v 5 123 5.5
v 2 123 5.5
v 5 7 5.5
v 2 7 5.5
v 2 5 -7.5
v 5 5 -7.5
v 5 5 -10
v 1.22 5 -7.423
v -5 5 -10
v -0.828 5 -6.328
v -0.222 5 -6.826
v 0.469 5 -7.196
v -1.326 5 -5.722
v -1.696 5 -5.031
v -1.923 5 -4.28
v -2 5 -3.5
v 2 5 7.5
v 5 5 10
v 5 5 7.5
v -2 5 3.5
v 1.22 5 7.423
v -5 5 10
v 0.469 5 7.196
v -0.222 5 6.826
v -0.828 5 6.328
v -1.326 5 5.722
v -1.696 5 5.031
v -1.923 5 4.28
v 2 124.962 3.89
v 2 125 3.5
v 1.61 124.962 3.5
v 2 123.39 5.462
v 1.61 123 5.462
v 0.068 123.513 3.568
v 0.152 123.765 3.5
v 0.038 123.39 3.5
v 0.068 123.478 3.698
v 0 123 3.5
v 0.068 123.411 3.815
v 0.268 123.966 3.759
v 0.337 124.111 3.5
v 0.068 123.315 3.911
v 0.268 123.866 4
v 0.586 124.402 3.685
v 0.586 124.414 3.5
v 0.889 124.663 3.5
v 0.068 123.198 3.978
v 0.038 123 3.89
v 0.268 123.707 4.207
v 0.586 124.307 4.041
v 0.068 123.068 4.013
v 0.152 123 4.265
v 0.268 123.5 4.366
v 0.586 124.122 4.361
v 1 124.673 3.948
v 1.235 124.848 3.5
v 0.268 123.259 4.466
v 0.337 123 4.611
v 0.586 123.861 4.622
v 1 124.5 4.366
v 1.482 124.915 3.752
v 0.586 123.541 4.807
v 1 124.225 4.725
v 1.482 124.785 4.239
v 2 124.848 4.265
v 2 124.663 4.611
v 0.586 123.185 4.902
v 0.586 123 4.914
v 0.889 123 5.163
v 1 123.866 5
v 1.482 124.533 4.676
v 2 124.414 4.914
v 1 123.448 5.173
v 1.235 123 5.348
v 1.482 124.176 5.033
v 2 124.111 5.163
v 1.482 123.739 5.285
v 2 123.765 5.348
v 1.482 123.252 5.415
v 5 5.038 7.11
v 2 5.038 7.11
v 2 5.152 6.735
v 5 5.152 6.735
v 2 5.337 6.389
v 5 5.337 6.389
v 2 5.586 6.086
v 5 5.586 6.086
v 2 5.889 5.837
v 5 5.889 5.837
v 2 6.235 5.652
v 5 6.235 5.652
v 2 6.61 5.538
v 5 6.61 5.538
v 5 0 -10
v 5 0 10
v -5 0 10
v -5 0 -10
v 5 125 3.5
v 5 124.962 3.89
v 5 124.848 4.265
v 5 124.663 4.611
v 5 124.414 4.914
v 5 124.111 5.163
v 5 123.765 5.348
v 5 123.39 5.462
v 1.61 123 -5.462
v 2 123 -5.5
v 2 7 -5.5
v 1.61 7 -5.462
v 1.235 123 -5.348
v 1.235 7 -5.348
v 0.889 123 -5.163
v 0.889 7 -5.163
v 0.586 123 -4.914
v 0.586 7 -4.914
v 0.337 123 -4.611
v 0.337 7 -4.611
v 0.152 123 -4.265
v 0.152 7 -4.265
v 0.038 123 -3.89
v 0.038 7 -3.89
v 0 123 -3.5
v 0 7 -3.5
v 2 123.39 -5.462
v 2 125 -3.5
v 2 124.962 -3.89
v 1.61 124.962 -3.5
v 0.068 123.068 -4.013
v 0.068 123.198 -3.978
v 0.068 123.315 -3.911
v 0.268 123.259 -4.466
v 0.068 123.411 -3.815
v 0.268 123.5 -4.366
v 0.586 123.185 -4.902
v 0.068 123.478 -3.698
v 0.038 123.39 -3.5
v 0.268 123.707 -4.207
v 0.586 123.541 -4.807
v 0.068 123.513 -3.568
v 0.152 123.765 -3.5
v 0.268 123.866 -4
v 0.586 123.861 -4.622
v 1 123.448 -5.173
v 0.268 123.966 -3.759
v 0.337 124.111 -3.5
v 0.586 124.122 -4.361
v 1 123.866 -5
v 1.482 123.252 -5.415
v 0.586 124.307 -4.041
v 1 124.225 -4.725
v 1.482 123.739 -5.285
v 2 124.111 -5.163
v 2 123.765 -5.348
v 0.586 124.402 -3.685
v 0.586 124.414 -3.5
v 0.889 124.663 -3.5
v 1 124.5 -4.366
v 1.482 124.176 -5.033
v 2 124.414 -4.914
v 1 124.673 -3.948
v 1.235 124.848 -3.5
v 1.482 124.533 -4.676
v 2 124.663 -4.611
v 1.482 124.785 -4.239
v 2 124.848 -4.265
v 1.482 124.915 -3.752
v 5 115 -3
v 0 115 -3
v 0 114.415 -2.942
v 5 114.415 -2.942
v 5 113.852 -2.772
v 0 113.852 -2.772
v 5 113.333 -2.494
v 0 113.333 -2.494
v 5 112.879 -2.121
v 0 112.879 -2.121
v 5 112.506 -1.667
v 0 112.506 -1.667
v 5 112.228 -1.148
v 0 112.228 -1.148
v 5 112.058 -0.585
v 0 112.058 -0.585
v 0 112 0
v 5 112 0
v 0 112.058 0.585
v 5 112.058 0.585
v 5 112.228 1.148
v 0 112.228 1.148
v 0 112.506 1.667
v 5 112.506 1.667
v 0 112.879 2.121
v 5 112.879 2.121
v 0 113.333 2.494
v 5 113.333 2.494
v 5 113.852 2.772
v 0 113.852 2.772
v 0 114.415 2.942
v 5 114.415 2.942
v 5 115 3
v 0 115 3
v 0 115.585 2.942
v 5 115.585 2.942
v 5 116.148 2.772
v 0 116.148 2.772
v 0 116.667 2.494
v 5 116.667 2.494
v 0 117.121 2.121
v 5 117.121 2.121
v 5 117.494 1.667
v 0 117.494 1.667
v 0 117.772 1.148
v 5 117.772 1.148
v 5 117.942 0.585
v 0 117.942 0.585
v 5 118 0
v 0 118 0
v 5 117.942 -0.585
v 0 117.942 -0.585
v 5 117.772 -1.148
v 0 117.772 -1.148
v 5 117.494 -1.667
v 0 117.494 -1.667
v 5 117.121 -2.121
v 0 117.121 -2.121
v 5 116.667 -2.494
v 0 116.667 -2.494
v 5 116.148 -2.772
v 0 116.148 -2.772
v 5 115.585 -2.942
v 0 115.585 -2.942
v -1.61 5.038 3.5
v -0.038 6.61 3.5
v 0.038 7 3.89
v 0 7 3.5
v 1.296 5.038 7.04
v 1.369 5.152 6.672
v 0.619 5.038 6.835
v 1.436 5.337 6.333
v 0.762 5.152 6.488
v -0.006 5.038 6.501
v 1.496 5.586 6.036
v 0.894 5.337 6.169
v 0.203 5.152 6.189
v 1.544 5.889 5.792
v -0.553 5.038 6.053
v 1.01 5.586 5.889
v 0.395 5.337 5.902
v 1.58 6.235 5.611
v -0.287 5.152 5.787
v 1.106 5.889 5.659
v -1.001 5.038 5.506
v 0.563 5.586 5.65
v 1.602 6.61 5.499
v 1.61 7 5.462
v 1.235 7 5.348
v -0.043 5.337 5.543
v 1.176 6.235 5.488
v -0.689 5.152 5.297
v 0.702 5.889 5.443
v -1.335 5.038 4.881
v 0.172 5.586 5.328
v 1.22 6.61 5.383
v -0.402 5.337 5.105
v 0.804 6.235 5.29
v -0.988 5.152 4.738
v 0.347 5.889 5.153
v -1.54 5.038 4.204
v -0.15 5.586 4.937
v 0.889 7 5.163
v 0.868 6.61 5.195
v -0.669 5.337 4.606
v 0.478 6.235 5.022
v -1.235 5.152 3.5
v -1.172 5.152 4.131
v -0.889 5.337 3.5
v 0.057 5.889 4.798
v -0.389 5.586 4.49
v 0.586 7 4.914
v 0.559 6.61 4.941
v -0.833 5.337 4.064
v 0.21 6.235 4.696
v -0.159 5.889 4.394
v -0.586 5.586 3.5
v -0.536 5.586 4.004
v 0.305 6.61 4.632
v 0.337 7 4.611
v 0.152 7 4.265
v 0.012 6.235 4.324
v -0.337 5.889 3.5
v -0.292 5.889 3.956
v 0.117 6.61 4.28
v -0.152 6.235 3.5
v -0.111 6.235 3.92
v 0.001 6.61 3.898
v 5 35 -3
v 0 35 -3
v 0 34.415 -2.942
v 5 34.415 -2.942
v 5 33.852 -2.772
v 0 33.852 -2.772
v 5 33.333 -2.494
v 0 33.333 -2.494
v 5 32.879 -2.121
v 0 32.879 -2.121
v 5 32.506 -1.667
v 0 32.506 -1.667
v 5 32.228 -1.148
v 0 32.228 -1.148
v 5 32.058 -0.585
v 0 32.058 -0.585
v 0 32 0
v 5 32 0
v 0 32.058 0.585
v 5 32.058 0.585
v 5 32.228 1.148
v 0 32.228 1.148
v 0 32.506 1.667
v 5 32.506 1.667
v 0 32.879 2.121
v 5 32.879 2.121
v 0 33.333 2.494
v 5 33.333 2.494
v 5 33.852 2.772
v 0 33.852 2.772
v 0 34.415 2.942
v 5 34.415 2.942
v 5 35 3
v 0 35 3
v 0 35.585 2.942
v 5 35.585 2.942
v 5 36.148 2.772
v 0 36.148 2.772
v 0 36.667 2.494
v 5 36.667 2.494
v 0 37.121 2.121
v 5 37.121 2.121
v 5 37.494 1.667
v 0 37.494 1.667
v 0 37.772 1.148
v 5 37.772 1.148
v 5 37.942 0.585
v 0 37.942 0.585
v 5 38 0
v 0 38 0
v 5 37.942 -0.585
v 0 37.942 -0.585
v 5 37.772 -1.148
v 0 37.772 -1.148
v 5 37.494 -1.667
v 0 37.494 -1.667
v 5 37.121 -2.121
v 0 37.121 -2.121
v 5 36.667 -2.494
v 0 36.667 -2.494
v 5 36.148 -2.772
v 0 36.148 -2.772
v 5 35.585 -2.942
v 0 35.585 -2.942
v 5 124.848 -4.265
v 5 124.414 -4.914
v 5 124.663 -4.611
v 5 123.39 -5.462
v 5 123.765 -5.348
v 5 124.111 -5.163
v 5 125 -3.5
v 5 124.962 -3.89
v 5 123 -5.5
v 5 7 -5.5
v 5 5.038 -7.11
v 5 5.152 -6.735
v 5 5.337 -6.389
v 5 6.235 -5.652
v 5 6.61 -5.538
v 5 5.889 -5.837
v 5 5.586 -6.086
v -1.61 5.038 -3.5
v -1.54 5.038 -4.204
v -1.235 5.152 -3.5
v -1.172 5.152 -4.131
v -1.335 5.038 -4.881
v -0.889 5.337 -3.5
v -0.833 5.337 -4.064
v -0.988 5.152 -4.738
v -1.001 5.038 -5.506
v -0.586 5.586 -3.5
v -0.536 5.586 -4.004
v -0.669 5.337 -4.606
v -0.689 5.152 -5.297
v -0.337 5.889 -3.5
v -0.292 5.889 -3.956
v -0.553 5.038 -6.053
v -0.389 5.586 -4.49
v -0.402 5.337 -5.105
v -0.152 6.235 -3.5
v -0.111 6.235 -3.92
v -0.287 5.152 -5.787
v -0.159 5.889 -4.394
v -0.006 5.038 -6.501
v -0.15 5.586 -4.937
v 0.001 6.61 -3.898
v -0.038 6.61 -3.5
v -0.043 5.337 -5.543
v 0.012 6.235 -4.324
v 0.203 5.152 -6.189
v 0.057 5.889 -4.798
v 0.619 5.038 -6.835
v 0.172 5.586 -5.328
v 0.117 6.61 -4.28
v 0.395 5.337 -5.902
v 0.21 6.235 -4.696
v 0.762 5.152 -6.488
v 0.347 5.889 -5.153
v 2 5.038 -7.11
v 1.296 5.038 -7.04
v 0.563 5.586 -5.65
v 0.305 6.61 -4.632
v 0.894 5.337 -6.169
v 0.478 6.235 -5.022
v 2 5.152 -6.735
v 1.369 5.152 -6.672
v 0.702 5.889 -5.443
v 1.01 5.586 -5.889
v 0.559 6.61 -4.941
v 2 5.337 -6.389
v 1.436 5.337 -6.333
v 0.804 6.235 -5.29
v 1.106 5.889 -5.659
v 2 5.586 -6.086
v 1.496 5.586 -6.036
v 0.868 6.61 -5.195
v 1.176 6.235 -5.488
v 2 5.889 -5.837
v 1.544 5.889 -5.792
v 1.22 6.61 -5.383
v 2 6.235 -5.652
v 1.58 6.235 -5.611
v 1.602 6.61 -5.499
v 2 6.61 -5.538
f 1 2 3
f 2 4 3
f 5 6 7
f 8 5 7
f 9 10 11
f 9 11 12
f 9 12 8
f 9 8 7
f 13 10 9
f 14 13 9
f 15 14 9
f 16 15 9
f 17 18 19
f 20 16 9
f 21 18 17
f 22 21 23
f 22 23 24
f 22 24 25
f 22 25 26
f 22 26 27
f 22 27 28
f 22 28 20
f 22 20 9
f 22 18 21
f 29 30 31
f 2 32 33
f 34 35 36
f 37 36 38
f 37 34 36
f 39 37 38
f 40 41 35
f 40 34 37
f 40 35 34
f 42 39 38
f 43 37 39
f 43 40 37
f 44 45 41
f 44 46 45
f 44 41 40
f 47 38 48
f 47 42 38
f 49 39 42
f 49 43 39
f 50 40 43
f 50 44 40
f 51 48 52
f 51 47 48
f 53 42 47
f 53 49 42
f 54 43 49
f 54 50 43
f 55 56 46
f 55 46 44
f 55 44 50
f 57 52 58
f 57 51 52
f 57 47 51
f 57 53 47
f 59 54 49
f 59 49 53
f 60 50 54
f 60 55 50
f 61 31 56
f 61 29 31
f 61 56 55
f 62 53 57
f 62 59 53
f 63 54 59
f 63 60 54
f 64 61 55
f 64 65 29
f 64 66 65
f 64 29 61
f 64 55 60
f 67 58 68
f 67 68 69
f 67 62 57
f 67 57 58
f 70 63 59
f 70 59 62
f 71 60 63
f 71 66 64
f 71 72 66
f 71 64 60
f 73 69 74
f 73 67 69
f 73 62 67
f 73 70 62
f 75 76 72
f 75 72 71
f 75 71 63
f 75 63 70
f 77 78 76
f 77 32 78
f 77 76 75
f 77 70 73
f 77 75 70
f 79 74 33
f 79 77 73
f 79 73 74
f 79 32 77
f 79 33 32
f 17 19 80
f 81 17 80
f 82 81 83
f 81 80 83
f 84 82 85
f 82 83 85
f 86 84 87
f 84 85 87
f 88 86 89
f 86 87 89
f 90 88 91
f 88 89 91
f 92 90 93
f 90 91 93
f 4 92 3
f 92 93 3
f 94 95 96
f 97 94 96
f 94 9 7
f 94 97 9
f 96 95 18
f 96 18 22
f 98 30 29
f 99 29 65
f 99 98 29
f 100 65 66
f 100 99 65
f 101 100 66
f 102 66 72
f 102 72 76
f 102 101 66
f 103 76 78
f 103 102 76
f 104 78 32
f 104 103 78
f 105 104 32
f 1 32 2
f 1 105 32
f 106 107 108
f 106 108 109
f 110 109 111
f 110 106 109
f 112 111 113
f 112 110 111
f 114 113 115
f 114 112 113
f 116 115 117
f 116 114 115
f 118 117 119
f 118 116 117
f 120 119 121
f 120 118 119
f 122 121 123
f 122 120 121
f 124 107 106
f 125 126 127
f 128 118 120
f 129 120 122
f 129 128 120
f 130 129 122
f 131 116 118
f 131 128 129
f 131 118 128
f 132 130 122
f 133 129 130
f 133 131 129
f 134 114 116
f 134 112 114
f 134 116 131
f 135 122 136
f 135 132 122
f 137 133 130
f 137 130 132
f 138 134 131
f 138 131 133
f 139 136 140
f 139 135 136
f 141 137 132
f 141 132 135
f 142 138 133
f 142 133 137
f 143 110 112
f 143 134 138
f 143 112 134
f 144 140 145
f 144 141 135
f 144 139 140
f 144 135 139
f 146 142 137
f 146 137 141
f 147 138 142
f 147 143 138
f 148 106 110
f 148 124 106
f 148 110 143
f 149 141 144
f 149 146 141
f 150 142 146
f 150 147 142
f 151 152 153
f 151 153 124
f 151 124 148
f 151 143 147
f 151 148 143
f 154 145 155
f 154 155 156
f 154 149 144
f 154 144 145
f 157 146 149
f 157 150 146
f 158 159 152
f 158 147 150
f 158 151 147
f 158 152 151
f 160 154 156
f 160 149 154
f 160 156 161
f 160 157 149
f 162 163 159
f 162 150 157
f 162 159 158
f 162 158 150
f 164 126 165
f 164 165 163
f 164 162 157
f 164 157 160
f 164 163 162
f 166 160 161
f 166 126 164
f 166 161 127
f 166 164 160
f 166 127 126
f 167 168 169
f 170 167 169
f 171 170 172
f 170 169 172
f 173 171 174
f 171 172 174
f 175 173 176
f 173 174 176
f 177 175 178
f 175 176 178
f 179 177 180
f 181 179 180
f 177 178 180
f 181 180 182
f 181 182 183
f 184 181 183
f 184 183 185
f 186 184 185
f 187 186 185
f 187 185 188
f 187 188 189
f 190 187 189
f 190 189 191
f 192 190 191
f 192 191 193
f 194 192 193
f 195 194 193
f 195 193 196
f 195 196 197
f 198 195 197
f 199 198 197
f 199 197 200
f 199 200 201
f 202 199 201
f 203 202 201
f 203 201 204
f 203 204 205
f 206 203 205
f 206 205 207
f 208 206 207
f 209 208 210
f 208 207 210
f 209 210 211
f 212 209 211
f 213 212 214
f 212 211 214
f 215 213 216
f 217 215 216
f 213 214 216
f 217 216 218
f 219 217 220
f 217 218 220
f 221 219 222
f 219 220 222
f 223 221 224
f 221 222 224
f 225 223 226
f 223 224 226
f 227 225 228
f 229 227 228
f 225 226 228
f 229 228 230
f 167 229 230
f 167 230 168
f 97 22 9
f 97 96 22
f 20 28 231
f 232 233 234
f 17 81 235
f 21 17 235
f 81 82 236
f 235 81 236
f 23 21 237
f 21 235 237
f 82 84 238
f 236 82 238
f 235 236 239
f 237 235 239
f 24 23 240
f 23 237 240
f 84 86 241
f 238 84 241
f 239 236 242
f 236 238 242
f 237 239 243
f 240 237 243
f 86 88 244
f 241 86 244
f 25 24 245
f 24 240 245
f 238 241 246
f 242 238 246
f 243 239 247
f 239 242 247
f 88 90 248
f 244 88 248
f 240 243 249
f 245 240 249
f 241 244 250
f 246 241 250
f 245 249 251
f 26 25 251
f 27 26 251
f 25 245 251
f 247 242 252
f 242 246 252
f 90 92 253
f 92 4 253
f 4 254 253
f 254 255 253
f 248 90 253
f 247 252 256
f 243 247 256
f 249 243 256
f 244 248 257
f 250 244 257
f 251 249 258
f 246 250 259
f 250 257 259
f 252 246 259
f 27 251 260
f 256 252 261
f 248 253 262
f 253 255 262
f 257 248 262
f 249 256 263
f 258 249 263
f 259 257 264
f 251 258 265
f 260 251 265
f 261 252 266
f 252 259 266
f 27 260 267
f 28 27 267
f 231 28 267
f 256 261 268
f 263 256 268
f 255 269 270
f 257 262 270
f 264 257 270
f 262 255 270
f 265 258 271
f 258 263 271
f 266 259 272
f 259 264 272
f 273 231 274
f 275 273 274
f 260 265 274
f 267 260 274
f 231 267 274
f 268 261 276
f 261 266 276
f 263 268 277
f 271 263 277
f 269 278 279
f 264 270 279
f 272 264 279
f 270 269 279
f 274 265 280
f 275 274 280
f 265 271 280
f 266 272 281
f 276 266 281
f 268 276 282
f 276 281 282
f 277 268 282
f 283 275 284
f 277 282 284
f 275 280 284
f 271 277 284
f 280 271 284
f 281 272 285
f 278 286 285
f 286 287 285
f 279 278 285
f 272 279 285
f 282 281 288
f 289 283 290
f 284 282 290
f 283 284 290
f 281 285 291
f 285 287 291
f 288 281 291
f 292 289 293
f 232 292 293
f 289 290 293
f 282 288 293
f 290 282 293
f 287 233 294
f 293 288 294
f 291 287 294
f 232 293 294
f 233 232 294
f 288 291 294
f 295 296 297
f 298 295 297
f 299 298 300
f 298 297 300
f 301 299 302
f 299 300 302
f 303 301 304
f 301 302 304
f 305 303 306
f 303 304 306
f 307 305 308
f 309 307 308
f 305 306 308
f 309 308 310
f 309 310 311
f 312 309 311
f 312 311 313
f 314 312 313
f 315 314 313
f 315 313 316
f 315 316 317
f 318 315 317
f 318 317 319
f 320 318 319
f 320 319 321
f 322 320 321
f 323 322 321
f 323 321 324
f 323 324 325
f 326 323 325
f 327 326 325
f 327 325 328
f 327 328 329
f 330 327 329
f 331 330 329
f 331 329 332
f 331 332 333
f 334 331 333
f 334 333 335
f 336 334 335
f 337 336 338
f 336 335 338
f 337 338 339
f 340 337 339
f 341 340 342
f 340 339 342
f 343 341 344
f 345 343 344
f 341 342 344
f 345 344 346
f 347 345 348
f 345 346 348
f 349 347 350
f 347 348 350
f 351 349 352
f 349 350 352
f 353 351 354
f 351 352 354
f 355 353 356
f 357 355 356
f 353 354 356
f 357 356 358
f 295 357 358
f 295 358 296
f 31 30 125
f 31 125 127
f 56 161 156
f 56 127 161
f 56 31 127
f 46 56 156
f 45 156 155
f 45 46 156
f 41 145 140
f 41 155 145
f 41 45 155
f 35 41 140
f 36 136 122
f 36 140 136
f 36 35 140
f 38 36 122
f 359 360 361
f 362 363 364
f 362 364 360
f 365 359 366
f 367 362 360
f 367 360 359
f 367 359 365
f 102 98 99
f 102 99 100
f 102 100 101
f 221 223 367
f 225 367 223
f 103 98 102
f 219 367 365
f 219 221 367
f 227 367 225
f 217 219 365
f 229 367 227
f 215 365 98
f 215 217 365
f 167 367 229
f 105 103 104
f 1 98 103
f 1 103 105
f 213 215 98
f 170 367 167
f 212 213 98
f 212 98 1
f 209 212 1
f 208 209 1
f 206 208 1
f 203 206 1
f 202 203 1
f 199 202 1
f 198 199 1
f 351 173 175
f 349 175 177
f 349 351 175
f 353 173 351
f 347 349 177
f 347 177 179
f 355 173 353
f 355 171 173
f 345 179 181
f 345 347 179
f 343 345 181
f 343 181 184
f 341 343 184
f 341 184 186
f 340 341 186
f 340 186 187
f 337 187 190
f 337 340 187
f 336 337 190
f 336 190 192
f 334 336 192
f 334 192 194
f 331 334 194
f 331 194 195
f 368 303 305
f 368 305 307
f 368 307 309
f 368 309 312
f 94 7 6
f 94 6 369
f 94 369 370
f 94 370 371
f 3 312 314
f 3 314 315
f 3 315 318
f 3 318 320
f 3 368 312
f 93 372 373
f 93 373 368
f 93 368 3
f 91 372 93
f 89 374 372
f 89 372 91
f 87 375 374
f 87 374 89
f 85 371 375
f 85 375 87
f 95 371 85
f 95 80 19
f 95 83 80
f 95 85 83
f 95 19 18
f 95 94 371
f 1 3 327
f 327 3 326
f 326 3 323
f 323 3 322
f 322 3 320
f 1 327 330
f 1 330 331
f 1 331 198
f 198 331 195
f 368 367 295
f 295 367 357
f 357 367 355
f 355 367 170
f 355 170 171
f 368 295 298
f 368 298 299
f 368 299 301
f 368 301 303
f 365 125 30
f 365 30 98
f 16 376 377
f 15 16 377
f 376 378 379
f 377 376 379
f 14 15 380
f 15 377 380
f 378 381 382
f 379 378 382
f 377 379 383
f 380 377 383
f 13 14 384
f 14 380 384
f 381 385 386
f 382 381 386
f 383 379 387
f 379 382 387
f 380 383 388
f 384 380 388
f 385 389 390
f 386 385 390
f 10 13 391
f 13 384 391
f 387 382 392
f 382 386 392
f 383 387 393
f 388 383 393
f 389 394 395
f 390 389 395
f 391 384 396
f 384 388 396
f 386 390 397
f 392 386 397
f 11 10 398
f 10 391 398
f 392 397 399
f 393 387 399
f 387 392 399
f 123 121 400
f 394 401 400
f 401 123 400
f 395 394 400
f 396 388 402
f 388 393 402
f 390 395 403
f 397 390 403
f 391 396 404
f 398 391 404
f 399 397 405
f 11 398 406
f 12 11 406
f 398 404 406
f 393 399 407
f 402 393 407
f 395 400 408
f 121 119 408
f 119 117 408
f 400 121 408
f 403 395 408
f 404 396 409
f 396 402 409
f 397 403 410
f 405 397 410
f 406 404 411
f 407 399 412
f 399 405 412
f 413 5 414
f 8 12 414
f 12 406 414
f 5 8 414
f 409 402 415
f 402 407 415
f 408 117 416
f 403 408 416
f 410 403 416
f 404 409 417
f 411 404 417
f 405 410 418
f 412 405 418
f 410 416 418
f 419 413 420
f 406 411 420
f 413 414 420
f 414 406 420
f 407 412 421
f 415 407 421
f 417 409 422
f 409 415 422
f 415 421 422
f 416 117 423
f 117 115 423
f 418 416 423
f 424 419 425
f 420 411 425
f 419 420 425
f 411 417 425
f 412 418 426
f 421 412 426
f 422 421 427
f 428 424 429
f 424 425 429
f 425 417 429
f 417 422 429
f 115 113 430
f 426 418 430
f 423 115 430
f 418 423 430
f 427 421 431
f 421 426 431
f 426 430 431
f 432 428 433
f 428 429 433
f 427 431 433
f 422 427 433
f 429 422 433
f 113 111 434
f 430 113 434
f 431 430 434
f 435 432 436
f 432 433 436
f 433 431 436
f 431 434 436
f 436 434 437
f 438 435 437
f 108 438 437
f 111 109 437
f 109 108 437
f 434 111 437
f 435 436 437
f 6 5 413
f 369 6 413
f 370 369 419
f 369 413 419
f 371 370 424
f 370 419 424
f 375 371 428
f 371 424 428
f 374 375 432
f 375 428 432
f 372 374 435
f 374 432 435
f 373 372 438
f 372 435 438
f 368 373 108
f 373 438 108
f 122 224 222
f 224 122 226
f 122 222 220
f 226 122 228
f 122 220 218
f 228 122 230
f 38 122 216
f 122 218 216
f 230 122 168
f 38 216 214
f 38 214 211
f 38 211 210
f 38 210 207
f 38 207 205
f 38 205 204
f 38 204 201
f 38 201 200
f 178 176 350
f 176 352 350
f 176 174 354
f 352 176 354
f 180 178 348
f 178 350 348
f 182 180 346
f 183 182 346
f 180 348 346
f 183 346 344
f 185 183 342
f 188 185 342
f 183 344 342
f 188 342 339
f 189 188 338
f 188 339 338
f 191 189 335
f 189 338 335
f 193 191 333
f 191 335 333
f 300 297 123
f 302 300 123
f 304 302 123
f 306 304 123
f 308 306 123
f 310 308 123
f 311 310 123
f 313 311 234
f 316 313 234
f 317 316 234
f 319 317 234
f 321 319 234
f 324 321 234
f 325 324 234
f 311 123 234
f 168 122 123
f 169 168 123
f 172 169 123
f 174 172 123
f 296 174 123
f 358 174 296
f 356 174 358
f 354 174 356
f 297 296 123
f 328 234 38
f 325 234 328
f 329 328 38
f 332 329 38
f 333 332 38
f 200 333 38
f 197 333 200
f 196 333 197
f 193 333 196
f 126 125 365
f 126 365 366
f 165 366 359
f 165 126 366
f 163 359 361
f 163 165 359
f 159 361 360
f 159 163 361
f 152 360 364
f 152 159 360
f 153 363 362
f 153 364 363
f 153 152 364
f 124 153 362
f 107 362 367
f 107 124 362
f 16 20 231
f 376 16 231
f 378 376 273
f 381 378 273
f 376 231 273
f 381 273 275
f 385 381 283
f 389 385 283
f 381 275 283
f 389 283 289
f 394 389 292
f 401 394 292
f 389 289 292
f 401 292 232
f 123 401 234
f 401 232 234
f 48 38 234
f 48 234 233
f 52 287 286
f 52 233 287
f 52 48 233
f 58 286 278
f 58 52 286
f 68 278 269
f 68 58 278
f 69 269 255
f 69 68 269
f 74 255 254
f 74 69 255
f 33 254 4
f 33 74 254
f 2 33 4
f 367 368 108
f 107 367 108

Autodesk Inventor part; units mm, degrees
ref_plane "YZ Plane" through (0, 0, 0) normal (1, 0, 0) x (0, 1, 0)
ref_plane "XZ Plane" through (0, 0, 0) normal (0, 1, 0) x (-1, 0, 0)
ref_plane "XY Plane" through (0, 0, 0) normal (0, 0, 1) x (1, 0, 0)
sketch "スケッチ1" plane through (0, 0, 0) normal (0, 1, 0) x (-1, 0, 0)
  line L0 (5, -10) -> (-5, -10)
  line L1 (-5, -10) -> (-5, 10)
  line L2 (-5, 10) -> (5, 10)
  line L3 (5, 10) -> (5, -10)
  line L4 (5, -10) -> (-5, 10) construction
  line L5 (-5, -10) -> (5, 10) construction
  point P0 (0, 0)
  dimension "d0" = 10
  dimension "d1" = 20
extrude "押し出し1" add sketch "スケッチ1" along normal blind 5
sketch "スケッチ4" plane through (0, 5, 0) normal (0, 1, 0) x (1, 0, 0)
  line L0 (5, 5.5) -> (0, 5.5)
  line L1 (0, 5.5) -> (0, -5.5)
  line L2 (0, -5.5) -> (5, -5.5)
  line L3 (5, -5.5) -> (5, 5.5)
  line L4 (5, -10) -> (5, 10) projected
  point P0 (0, 0)
  dimension "d11" = 5
  dimension "d12" = 11
  dimension "d13" = 5
  dimension "d14" = 5.5
extrude "押し出し4" add sketch "スケッチ4" along normal blind 120
sketch "スケッチ6" plane through (5, 0, 10) normal (1, 0, 0) x (0, 0, -1)
  line L0 (4.5, 5) -> (15.5, 5) projected
  line L1 (15.5, 5) -> (15.5, 125) projected
  point P0 (10, 0)
  point P1 (10, 35)
  point P2 (10, 115)
  dimension "d30" = 30
  dimension "d31" = 80
  dimension "d32" = 5.5
  dimension "d33" = 5.5
hole "穴2" at (5, 35, 0) at (5, 115, 0) direction (-1, 0, 0) diameter 6 end through all
fillet "フィレット3" radius 2 8 edges at (2.5, 125, 5.5) (2.5, 125, -5.5) (0, 125, 0) (0, 65, 5.5) (0, 65, -5.5) (2.5, 5, 5.5) (0, 5, 0) (2.5, 5, -5.5)
properties part number "baseB"
